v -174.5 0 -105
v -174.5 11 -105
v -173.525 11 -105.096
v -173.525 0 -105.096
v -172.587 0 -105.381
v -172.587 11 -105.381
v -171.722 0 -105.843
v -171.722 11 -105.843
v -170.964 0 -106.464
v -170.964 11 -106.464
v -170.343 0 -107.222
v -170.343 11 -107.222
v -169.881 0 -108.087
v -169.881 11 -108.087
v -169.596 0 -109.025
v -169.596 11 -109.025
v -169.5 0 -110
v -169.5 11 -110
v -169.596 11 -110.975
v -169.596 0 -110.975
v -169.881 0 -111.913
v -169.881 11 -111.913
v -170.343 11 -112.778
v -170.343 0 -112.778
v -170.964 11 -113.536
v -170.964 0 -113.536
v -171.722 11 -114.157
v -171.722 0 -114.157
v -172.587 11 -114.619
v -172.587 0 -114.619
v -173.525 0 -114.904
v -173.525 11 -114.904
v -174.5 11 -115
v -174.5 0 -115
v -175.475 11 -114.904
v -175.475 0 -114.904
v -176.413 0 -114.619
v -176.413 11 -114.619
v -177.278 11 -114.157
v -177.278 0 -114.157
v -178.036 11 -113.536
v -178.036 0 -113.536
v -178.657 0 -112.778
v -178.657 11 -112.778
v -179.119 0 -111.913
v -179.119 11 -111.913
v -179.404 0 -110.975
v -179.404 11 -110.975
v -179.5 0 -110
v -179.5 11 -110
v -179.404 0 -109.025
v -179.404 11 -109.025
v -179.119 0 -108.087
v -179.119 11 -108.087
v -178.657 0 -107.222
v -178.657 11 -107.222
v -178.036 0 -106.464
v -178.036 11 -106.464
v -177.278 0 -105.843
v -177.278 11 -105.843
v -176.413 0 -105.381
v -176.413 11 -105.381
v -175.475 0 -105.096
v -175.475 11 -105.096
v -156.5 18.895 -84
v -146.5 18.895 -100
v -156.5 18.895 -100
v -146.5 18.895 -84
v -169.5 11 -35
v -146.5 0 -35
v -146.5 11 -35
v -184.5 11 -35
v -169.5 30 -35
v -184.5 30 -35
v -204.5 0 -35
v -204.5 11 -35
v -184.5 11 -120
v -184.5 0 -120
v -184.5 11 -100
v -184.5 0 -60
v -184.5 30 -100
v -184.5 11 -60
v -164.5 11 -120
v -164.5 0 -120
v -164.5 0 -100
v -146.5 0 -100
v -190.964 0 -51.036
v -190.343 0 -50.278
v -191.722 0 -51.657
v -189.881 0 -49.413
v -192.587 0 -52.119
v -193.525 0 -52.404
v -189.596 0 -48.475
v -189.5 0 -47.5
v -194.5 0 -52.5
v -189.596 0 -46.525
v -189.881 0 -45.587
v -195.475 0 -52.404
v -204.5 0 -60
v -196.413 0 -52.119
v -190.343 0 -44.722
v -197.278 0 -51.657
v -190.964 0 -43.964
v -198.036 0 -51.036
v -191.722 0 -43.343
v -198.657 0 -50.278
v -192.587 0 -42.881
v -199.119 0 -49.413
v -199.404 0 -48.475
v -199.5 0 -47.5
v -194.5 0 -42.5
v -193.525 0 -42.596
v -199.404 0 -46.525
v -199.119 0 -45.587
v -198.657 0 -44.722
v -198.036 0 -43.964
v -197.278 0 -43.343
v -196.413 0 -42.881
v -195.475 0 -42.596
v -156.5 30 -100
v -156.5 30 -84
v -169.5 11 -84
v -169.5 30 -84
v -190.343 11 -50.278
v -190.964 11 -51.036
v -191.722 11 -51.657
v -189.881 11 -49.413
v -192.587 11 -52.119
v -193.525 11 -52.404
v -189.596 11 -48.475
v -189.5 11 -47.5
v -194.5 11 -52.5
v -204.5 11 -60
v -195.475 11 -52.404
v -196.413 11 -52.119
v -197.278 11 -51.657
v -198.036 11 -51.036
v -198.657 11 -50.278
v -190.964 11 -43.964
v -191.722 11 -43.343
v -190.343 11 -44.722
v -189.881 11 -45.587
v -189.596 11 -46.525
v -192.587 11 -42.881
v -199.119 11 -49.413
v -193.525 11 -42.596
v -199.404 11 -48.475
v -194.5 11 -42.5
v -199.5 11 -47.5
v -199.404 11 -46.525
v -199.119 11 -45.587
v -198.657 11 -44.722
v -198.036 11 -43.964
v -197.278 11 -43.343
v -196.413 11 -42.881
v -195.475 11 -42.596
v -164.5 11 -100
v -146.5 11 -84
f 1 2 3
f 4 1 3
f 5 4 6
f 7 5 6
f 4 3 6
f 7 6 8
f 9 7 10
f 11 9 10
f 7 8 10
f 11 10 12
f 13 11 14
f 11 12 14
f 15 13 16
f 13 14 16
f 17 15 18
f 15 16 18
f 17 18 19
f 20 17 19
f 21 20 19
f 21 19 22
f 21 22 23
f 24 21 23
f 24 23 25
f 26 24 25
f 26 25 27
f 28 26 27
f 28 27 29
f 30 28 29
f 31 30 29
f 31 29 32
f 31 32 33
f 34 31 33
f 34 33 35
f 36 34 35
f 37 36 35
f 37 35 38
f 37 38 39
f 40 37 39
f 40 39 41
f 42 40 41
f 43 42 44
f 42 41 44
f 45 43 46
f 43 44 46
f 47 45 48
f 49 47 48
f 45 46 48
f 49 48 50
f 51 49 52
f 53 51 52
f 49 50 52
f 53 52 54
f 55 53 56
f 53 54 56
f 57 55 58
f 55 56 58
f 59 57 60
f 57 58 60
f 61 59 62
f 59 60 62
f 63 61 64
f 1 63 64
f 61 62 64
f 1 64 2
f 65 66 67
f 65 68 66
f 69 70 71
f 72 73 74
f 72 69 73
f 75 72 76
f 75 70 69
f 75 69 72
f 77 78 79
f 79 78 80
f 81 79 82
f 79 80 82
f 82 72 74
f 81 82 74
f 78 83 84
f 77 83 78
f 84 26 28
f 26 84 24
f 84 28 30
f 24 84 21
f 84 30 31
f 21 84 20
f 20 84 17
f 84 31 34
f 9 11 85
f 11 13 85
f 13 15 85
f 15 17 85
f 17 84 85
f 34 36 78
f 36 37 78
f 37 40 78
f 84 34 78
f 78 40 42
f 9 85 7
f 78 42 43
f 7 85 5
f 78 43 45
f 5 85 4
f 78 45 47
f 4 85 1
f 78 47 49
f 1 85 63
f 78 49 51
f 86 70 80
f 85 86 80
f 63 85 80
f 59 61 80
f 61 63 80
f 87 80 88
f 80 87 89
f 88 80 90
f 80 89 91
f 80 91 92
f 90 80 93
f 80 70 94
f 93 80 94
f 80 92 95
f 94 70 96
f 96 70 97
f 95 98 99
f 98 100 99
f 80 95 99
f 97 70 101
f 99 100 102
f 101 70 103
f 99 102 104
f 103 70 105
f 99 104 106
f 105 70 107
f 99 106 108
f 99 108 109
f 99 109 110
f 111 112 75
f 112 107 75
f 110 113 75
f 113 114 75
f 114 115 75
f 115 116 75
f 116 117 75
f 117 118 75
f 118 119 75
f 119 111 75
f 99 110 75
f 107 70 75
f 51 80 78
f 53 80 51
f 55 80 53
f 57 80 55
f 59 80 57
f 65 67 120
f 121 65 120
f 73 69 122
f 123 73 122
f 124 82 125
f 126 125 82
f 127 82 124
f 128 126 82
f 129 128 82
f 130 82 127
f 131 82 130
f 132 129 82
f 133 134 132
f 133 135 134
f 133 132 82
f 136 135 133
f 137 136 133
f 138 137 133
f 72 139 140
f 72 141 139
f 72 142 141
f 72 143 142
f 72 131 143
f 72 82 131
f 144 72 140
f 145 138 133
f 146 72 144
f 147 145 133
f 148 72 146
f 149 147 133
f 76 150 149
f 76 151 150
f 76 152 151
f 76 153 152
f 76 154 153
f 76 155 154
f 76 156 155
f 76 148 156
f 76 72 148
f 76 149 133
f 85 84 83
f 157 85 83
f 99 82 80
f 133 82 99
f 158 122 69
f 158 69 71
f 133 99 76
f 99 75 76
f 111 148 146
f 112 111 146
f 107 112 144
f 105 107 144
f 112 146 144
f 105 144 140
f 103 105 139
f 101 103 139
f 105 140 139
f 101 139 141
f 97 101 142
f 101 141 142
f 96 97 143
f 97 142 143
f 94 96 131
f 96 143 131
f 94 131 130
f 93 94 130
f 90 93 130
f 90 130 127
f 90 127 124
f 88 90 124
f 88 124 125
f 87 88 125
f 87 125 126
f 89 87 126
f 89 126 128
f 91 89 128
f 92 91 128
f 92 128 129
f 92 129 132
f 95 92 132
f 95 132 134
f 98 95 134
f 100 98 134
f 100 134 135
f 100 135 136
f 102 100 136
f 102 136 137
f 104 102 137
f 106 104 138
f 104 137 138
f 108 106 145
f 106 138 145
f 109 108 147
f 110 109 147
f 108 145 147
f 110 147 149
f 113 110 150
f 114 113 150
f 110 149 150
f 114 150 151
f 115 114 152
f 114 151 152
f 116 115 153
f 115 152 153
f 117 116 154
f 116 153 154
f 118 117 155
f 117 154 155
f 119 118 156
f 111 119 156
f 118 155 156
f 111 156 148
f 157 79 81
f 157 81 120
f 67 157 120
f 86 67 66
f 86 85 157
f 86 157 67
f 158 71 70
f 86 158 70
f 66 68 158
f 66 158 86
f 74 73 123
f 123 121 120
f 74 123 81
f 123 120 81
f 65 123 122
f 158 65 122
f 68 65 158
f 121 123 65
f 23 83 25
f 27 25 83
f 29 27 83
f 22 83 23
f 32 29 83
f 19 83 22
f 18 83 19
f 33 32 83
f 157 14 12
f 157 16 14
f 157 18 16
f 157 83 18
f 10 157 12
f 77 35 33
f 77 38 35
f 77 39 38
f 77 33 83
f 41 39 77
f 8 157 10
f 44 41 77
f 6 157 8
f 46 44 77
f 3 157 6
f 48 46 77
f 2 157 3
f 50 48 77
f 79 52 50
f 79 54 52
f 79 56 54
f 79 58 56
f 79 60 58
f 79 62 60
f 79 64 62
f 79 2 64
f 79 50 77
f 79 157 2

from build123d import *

# Parameters (mm, degrees)
SKETCH1_W               = 369
SKETCH1_H               = 200
BOSS_EXTRUDE1_DEPTH     = 20
SKETCH2_W               = 129
SKETCH2_H               = 16
BOSS_EXTRUDE2_DEPTH     = 10
SKETCH3_W               = 342
SKETCH3_H               = 168
CUT_EXTRUDE1_DEPTH      = 9
SKETCH4_W               = 100
SKETCH4_H               = 10
BOSS_EXTRUDE3_DEPTH     = 60
CUT_EXTRUDE3_DEPTH      = 10
CUT_EXTRUDE3_DEPTH_BACK = 60
SKETCH10_W              = 404
SKETCH10_H              = 324.796202869
CUT_EXTRUDE4_DEPTH      = 69
CUT_EXTRUDE7_DEPTH      = 274.752168941
CUT_EXTRUDE7_DEPTH_BACK = 274.752168941
SKETCH14_W              = 37
SKETCH14_H              = 34.717467541
SKETCH12_W              = 50
SKETCH12_H              = 11
BOSS_EXTRUDE6_DEPTH     = 20
SKETCH13_R              = 4
CUT_EXTRUDE6_DEPTH      = 229.43215623
CORTAR_EXTRUIR4_DEPTH   = 220
CROQUIS5_W              = 20
CROQUIS5_H              = 11
SALIENTE_EXTRUIR2_DEPTH = 10
CROQUIS6_W              = 20
CROQUIS6_H              = 11
SALIENTE_EXTRUIR3_DEPTH = 20
CROQUIS8_R              = 5
CORTAR_EXTRUIR5_DEPTH   = 48
CROQUIS9_W              = 38
CROQUIS9_H              = 65
CORTAR_EXTRUIR6_DEPTH   = 85


with BuildPart() as part:
    # Sketch1 → Boss-Extrude1 (new body)
    with BuildSketch(Plane(origin=(0, 0, 0), x_dir=(1, 0, 0), z_dir=(0, 1, 0))):
        Rectangle(SKETCH1_W, SKETCH1_H)
    extrude(amount=BOSS_EXTRUDE1_DEPTH)

    # Sketch2 → Boss-Extrude2 (add)
    with BuildSketch(Plane(origin=(0, 20, 0), x_dir=(1, 0, 0), z_dir=(0, 1, 0))):
        Polygon((-184.5, -100), (-169.5, -100), (-119.5, -100), (-119.5, -84), (-169.5, -84), (-169.5, -35), (-184.5, -35), align=None)
        Polygon((-184.5, 100), (-169.5, 100), (-119.5, 100), (-119.5, 84), (-169.5, 84), (-169.5, 35), (-184.5, 35), align=None)
        with Locations((20, -92)):
            Rectangle(SKETCH2_W, SKETCH2_H)
        with Locations((20, 92)):
            Rectangle(SKETCH2_W, SKETCH2_H)
    extrude(amount=BOSS_EXTRUDE2_DEPTH)

    # Sketch3 → Cut-Extrude1 (cut)
    with BuildSketch(Plane(origin=(0, 20, 0), x_dir=(1, 0, 0), z_dir=(0, 1, 0))):
        with Locations((1.5, 0)):
            Rectangle(SKETCH3_W, SKETCH3_H)
    extrude(amount=-CUT_EXTRUDE1_DEPTH, mode=Mode.SUBTRACT)

    # Sketch4 → Boss-Extrude3 (add)
    with BuildSketch(Plane(origin=(0, 0, -100), x_dir=(-1, 0, 0), z_dir=(0, 0, -1))):
        with Locations((-19.5, 25)):
            Rectangle(SKETCH4_W, SKETCH4_H)
    extrude(amount=BOSS_EXTRUDE3_DEPTH)

    # Sketch6 → Cut-Extrude3 (cut, two sides: drawn at the far end of the back side and taken through both)
    with BuildSketch(Plane.XY.offset(-84).offset(-CUT_EXTRUDE3_DEPTH_BACK)):
        with BuildLine():
            Line((-24.5, 30), (-26.030765637, 28.081051534))
            ThreePointArc((-26.030765637, 28.081051534), (-26.158442873, 26.948989892), (-25.193843525, 26.342843758))
            Line((-25.193843525, 26.342843758), (-15.806155854, 26.342843758))
            ThreePointArc((-15.806155854, 26.342843758), (-14.841556992, 26.948990172), (-14.969234363, 28.081051534))
            Line((-14.969234363, 28.081051534), (-16.5, 30))
            Line((-16.5, 30), (-24.5, 30))
        make_face()
        with BuildLine():
            Line((56.5, 30), (54.981983491, 27.801494438))
            ThreePointArc((54.981983491, 27.801494438), (54.9192914, 26.767046688), (55.80615587, 26.230871478))
            Line((55.80615587, 26.230871478), (65.193843541, 26.230871478))
            ThreePointArc((65.193843541, 26.230871478), (66.080708464, 26.767046428), (66.018016509, 27.801494438))
            Line((66.018016509, 27.801494438), (64.5, 30))
            Line((64.5, 30), (56.5, 30))
        make_face()
    extrude(amount=CUT_EXTRUDE3_DEPTH + CUT_EXTRUDE3_DEPTH_BACK, mode=Mode.SUBTRACT)

    # Sketch10 → Cut-Extrude4 (cut)
    with BuildSketch(Plane(origin=(0, 30, 0), x_dir=(1, 0, 0), z_dir=(0, 1, 0))):
        with Locations((55.5, -0.89352463)):
            Rectangle(SKETCH10_W, SKETCH10_H)
    extrude(amount=-CUT_EXTRUDE4_DEPTH, mode=Mode.SUBTRACT)

    # Sketch14 → Cut-Extrude7 (cut, two sides: drawn at the far end of the back side and taken through both)
    with BuildSketch(Plane(origin=(0, 0, -100), x_dir=(-1, 0, 0), z_dir=(0, 0, -1)).offset(-CUT_EXTRUDE7_DEPTH_BACK)):
        with Locations((138, 36.253686327)):
            Rectangle(SKETCH14_W, SKETCH14_H)
    extrude(amount=CUT_EXTRUDE7_DEPTH + CUT_EXTRUDE7_DEPTH_BACK, mode=Mode.SUBTRACT)

    # Sketch12 → Boss-Extrude6 (add)
    with BuildSketch(Plane.ZY.offset(184.5)):
        with Locations((-25, 5.5)):
            Rectangle(SKETCH12_W, SKETCH12_H)
    extrude(amount=BOSS_EXTRUDE6_DEPTH)

    # Sketch13 → Cut-Extrude6 (cut, through all)
    with BuildSketch(Plane(origin=(0, 11, 0), x_dir=(1, 0, 0), z_dir=(0, 1, 0))):
        with Locations(Location((-194.5, 25, 0), (0, 0, 270))):
            Circle(SKETCH13_R)
    extrude(amount=-CUT_EXTRUDE6_DEPTH, mode=Mode.SUBTRACT)

    # Croquis3 → Cortar-Extruir4 (cut)
    with BuildSketch(Plane(origin=(0, 30, 0), x_dir=(1, 0, 0), z_dir=(0, 1, 0))):
        Polygon((-169.5, -35), (-146.5, -35), (-146.5, 0), (-146.5, 35), (-204.5, 35), (-204.5, 0), (-204.5, -35), (-184.5, -35), align=None)
    extrude(amount=-CORTAR_EXTRUIR4_DEPTH, mode=Mode.SUBTRACT)


with BuildPart() as cortar_extruir4_piece_1:
    # of the separate pieces the step leaves, piece 1, a body of its own (cortar_extruir4_pieces)
    add(part.part.solids().sort_by_distance((-184.5, 30, -100))[0])

    # Croquis5 → Saliente-Extruir2 (add)
    with BuildSketch(Plane(origin=(0, 0, -50), x_dir=(-1, 0, 0), z_dir=(0, 0, -1))):
        with Locations((194.5, 5.5)):
            Rectangle(CROQUIS5_W, CROQUIS5_H)
    extrude(amount=SALIENTE_EXTRUIR2_DEPTH)

    # Croquis6 → Saliente-Extruir3 (add)
    with BuildSketch(Plane(origin=(0, 0, -100), x_dir=(-1, 0, 0), z_dir=(0, 0, -1))):
        with Locations((174.5, 5.5)):
            Rectangle(CROQUIS6_W, CROQUIS6_H)
    extrude(amount=SALIENTE_EXTRUIR3_DEPTH)

    # Croquis8 → Cortar-Extruir5 (cut)
    with BuildSketch(Plane(origin=(0, 11, 0), x_dir=(1, 0, 0), z_dir=(0, 1, 0))):
        with Locations(Location((-194.5, 47.5, 0), (0, 0, 270))):
            Circle(CROQUIS8_R)
        with Locations((-194.5, -47.5)):
            Circle(CROQUIS8_R)
        with Locations((-174.5, -110)):
            Circle(CROQUIS8_R)
        with Locations(Location((-174.5, 110, 0), (0, 0, 270))):
            Circle(CROQUIS8_R)
    extrude(amount=-CORTAR_EXTRUIR5_DEPTH, mode=Mode.SUBTRACT)


with BuildPart() as cortar_extruir4_piece_2:
    # of the separate pieces the step leaves, piece 2, a body of its own (cortar_extruir4_pieces)
    add(part.part.solids().sort_by_distance((-184.5, 30, 100))[0])

    # Croquis9 → Cortar-Extruir6 (cut)
    with BuildSketch(Plane(origin=(0, 30, 0), x_dir=(1, 0, 0), z_dir=(0, 1, 0))):
        with Locations((-165.5, -67.5)):
            Rectangle(CROQUIS9_W, CROQUIS9_H)
    extrude(amount=-CORTAR_EXTRUIR6_DEPTH, mode=Mode.SUBTRACT)


solid = cortar_extruir4_piece_1.part
